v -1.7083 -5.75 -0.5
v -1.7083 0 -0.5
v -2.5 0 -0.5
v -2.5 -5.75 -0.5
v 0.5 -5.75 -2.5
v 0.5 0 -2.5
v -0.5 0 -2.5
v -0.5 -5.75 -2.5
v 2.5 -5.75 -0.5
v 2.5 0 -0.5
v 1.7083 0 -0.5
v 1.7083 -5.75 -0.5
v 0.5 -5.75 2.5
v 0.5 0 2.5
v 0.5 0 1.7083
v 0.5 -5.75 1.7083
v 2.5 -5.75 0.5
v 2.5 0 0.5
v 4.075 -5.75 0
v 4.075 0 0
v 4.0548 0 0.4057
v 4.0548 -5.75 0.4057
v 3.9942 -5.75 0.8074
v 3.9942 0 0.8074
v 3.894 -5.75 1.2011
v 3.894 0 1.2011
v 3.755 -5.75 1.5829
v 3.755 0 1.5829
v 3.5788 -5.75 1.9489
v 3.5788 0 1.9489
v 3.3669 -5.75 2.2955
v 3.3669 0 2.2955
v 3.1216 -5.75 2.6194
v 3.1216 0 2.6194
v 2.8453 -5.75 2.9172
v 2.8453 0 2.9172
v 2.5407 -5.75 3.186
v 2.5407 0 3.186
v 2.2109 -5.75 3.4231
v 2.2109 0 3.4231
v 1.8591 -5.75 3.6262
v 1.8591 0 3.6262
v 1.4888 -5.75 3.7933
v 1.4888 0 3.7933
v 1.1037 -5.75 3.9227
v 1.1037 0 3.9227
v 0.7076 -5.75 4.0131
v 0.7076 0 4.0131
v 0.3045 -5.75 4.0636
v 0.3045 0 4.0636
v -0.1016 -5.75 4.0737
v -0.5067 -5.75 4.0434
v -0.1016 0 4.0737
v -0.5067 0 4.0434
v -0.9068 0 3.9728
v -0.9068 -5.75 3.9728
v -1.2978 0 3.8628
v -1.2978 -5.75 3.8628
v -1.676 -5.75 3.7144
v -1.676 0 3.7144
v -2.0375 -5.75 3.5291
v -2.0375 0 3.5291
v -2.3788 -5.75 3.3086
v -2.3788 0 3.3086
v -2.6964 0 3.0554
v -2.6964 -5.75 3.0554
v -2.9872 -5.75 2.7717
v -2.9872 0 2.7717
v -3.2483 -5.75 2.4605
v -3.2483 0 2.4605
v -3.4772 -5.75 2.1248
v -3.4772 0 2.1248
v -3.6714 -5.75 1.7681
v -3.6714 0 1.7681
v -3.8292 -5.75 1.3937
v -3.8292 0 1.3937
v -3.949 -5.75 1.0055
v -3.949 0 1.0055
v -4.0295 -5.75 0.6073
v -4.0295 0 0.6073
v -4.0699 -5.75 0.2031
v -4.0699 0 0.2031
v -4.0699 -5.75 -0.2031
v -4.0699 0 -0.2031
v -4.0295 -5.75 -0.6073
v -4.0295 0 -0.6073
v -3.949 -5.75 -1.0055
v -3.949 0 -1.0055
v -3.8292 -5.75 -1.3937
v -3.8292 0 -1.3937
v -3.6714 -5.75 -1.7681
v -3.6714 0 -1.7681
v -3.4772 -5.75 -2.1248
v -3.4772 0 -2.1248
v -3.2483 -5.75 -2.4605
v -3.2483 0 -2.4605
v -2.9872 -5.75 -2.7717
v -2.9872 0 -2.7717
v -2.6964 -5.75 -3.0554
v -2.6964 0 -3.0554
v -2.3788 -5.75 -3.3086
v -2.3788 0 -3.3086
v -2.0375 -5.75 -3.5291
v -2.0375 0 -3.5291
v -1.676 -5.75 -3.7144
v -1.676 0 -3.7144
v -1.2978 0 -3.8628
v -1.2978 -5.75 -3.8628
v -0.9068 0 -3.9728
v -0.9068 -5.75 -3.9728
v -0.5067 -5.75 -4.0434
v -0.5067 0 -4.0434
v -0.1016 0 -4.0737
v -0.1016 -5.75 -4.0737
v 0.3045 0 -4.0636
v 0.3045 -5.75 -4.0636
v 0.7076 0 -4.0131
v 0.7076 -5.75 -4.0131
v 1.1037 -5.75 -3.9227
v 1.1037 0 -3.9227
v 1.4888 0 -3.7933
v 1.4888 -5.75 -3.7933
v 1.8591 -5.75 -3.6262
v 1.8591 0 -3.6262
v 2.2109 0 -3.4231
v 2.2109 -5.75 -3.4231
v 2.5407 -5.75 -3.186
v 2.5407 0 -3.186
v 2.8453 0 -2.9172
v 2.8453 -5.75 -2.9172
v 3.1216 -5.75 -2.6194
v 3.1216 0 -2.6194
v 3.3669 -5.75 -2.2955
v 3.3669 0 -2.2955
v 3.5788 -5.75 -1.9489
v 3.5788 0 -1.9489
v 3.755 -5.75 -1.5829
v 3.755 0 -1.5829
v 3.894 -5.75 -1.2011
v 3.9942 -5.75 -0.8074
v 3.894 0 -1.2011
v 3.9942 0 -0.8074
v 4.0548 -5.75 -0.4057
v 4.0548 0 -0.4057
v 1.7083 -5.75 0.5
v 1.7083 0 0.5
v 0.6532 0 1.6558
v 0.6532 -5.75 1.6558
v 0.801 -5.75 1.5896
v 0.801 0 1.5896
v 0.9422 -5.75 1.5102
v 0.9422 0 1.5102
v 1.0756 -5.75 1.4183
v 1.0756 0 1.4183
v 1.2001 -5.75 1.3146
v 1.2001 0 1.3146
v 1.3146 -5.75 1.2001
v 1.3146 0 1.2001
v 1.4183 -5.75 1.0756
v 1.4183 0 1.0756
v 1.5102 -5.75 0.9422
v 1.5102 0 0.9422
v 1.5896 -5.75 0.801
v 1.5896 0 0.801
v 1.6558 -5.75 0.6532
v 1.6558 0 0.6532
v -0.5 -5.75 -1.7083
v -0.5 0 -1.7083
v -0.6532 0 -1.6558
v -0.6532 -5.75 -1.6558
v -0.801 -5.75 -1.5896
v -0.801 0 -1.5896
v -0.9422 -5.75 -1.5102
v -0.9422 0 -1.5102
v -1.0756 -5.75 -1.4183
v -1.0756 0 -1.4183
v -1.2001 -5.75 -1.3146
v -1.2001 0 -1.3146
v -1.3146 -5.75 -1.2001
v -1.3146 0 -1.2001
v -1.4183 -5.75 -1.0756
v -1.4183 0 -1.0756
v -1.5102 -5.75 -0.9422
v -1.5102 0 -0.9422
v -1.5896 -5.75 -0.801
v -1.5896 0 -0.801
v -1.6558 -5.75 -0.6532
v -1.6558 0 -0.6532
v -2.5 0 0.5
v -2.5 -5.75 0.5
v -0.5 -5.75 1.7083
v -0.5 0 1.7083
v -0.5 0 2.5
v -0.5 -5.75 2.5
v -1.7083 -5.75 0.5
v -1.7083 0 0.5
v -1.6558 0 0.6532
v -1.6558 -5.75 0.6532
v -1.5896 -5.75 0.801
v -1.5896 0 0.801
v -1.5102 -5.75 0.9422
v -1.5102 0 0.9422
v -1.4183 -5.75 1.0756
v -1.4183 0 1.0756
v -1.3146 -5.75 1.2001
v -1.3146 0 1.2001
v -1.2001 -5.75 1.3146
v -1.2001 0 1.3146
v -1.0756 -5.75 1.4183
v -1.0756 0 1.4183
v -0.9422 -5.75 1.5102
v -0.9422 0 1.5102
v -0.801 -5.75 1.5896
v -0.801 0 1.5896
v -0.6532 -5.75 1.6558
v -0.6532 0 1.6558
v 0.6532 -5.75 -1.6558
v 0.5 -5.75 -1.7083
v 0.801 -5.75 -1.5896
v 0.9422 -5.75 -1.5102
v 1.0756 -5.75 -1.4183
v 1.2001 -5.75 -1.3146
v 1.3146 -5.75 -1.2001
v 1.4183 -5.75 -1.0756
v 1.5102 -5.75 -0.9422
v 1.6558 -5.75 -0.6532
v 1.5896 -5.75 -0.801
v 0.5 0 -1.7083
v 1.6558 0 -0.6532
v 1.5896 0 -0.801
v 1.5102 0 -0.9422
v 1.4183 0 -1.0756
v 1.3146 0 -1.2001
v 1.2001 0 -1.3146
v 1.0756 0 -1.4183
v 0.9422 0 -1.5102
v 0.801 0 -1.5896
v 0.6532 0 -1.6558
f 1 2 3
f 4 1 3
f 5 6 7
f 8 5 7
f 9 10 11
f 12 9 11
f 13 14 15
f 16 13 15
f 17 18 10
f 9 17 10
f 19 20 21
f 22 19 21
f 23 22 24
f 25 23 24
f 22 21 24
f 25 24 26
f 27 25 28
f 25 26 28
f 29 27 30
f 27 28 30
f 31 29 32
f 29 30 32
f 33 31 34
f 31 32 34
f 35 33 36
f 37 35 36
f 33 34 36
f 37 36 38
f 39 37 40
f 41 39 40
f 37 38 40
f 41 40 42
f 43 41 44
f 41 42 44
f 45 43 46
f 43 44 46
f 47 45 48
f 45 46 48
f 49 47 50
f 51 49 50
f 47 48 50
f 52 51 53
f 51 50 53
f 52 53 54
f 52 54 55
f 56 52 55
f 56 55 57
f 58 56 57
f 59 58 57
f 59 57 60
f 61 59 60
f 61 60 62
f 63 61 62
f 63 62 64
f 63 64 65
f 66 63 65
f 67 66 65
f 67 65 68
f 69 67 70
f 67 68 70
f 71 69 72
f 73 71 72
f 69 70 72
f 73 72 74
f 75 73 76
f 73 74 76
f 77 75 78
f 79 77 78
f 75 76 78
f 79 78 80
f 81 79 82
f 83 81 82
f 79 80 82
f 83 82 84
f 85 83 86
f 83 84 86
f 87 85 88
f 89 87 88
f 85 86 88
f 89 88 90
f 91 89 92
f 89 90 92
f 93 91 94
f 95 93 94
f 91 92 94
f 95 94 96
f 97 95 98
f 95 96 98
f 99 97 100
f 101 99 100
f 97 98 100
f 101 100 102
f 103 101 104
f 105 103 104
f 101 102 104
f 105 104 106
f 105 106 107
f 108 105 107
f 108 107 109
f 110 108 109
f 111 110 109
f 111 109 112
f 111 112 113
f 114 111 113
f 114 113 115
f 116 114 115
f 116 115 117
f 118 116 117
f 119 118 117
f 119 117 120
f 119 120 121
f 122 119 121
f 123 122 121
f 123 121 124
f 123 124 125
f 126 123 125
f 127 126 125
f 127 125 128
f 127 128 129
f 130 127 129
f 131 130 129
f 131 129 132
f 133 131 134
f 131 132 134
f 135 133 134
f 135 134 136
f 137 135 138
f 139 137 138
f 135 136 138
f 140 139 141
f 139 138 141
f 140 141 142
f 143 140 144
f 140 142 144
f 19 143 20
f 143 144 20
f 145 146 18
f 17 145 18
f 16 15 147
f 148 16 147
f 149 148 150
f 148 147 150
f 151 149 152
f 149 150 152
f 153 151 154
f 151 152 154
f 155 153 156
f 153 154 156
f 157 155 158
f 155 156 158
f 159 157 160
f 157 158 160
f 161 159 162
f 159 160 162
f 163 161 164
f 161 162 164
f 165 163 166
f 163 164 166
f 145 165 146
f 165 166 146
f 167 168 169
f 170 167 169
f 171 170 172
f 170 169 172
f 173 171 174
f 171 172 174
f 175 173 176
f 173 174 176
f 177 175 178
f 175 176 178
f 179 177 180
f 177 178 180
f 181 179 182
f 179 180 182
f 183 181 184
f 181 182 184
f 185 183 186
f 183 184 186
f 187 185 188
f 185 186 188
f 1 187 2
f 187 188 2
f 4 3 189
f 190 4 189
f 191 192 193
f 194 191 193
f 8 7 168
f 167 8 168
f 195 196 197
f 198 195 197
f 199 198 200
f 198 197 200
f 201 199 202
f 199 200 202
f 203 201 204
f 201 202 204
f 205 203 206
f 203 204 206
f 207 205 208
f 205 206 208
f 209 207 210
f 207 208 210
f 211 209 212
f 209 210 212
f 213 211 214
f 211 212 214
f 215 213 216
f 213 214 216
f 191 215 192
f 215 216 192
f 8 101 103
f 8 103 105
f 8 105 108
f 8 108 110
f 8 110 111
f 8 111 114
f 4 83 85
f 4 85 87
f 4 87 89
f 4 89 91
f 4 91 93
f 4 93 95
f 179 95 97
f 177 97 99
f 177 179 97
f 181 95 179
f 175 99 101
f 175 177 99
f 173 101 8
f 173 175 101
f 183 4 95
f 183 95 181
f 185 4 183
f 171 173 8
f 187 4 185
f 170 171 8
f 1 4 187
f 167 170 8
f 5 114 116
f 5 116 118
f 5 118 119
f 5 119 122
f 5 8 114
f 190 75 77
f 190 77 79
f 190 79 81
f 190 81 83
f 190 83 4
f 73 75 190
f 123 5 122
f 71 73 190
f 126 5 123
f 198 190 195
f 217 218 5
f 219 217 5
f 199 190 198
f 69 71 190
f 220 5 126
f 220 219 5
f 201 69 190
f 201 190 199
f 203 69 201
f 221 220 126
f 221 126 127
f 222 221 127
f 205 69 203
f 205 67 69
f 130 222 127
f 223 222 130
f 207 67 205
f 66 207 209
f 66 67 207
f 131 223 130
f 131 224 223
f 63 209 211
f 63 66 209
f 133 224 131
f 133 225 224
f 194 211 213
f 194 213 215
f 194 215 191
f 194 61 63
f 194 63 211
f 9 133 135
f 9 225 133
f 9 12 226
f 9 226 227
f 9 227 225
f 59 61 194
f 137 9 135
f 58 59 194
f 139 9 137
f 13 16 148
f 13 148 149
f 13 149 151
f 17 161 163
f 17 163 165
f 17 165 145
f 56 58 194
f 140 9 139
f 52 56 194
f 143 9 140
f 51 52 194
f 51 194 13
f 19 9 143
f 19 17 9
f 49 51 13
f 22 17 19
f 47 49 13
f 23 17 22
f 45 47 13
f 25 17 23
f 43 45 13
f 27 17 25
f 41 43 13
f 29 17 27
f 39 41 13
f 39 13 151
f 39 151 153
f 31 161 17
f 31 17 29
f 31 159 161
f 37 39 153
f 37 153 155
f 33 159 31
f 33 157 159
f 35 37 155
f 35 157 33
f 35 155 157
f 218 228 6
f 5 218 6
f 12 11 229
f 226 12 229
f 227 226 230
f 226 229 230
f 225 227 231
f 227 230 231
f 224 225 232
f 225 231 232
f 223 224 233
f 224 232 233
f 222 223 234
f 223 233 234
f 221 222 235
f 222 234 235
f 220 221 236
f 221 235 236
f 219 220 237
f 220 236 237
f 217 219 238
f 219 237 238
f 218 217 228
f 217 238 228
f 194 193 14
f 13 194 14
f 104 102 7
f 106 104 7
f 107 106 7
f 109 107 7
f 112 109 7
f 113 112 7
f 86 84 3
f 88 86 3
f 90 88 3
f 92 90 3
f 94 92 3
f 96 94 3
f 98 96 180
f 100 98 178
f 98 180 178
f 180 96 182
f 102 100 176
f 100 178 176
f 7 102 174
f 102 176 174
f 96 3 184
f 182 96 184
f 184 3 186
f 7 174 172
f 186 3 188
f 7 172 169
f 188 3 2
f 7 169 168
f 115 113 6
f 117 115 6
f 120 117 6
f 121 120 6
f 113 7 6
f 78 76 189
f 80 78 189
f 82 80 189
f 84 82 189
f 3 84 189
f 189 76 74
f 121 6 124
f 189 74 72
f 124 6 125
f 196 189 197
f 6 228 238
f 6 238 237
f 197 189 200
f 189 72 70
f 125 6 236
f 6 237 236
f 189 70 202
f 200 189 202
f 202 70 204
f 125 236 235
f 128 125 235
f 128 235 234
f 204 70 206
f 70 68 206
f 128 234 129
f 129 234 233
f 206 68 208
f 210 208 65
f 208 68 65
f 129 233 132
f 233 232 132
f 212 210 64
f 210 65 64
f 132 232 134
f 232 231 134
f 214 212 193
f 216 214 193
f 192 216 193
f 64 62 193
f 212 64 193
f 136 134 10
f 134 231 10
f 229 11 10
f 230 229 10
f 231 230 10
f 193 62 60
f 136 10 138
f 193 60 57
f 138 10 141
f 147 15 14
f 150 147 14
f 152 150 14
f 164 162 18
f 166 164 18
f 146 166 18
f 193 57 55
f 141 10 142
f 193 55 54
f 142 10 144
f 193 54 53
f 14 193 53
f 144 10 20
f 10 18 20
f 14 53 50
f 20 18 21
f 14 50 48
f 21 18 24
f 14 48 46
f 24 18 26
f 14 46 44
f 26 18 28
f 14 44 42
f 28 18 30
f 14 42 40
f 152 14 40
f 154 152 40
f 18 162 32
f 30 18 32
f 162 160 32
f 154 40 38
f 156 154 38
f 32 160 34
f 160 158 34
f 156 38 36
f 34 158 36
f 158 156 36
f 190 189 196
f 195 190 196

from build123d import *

# Parameters (mm, degrees)
F0_R     = 4.075
F1_DEPTH = 5.75


with BuildPart() as f1:
    # F0 (on Front) → F1 (new body)
    with BuildSketch(Plane.XZ):
        Circle(F0_R)
        with BuildLine():
            Line((-0.5, 2.5), (0.5, 2.5))
            Line((0.5, 2.5), (0.5, 1.708333))
            ThreePointArc((0.5, 1.708333), (1.25865, 1.25865), (1.708333, 0.5))
            Line((1.708333, 0.5), (2.5, 0.5))
            Line((2.5, 0.5), (2.5, -0.5))
            Line((2.5, -0.5), (1.708333, -0.5))
            ThreePointArc((1.708333, -0.5), (1.25865, -1.25865), (0.5, -1.708333))
            Line((0.5, -1.708333), (0.5, -2.5))
            Line((0.5, -2.5), (-0.5, -2.5))
            Line((-0.5, -2.5), (-0.5, -1.708333))
            ThreePointArc((-0.5, -1.708333), (-1.25865, -1.25865), (-1.708333, -0.5))
            Line((-1.708333, -0.5), (-2.5, -0.5))
            Line((-2.5, -0.5), (-2.5, 0.5))
            Line((-2.5, 0.5), (-1.708333, 0.5))
            ThreePointArc((-1.708333, 0.5), (-1.25865, 1.25865), (-0.5, 1.708333))
            Line((-0.5, 1.708333), (-0.5, 2.5))
        make_face(mode=Mode.SUBTRACT)
    extrude(amount=F1_DEPTH)


solid = f1.part
